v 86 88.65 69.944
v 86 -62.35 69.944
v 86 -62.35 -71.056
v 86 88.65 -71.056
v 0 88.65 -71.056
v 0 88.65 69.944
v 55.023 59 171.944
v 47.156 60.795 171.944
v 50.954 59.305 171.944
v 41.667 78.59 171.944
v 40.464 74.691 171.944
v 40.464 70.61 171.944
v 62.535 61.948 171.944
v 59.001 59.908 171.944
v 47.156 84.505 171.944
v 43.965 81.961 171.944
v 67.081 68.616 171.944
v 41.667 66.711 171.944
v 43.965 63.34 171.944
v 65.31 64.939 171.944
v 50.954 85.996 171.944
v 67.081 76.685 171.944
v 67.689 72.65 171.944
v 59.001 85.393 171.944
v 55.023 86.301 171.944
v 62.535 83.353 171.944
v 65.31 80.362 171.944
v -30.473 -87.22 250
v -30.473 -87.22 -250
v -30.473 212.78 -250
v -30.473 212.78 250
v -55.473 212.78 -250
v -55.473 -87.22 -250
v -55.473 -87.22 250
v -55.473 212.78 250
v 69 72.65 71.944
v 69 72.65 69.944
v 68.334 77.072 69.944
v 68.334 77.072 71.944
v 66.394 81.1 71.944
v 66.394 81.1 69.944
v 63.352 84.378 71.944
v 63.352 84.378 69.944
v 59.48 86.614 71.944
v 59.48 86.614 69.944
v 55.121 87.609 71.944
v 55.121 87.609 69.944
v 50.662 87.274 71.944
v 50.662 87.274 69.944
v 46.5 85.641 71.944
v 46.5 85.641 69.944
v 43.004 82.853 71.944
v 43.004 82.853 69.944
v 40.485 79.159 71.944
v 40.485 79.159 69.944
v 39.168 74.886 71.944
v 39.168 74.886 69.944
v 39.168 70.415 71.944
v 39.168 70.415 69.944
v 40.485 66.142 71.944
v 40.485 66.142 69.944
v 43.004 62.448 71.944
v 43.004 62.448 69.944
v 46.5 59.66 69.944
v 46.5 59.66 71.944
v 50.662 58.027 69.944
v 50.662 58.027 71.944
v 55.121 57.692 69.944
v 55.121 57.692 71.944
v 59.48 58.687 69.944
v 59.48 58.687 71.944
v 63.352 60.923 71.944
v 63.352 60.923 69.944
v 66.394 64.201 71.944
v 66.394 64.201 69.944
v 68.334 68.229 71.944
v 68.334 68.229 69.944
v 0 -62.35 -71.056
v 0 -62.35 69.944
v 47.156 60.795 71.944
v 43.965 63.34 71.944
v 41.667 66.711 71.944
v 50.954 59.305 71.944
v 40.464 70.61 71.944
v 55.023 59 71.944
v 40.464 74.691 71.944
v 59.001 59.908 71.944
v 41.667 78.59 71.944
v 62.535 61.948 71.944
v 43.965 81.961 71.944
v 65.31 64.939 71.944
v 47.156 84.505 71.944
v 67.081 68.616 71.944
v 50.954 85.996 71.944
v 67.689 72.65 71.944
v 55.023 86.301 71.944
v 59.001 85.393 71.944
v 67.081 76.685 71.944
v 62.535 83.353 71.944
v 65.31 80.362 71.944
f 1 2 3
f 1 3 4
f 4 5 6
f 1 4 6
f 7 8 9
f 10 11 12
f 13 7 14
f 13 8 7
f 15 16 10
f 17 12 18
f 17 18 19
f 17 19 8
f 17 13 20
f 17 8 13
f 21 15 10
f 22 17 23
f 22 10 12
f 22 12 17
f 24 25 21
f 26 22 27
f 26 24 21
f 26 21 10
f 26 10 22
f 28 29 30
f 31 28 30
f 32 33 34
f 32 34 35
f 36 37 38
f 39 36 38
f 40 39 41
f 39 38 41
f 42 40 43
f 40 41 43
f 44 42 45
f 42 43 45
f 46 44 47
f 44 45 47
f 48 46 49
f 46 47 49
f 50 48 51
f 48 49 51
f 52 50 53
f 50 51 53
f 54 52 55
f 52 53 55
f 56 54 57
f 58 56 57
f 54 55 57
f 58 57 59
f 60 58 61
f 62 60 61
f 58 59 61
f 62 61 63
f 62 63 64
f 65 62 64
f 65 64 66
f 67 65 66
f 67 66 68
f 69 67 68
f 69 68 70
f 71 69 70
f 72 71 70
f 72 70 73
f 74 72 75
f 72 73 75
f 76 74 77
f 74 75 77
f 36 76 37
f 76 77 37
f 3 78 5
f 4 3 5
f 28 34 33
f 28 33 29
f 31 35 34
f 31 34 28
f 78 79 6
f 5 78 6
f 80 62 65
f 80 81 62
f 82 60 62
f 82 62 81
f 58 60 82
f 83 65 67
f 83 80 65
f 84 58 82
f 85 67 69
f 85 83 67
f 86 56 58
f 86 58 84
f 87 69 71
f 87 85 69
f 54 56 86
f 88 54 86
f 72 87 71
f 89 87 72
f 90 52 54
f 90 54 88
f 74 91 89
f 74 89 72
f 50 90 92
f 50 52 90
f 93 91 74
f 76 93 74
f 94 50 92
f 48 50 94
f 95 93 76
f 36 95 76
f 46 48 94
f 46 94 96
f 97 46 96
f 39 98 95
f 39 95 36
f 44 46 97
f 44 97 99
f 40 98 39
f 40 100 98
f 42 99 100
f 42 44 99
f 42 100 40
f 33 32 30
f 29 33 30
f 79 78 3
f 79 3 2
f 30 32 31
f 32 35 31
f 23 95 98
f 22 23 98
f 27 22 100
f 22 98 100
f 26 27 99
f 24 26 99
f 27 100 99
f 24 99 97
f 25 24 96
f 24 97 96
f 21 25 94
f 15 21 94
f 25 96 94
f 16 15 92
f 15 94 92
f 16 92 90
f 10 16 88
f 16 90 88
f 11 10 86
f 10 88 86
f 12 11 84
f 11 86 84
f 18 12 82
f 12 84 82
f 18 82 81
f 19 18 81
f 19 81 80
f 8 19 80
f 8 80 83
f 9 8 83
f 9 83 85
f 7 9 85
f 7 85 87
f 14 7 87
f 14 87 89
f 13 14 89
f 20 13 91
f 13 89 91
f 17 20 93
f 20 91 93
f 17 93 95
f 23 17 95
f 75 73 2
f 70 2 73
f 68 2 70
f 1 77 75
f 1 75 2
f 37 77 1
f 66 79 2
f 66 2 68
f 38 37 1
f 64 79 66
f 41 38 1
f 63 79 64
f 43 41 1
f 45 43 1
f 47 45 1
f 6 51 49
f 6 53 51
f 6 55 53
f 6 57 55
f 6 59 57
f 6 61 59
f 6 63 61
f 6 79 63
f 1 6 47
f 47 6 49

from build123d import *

# Parameters (mm, degrees)
F0_W     = 151
F0_H     = 141
F1_DEPTH = 86
F2_R     = 15
F3_DEPTH = 2
F4_R     = 13.688921
F5_DEPTH = 100
F6_W     = 25
F6_H     = 300
F7_DEPTH = 250


with BuildPart() as f1:
    # F0 (on Right) → F1 (new body)
    with BuildSketch(Plane.YZ):
        with Locations((13.150447, -0.55588)):
            Rectangle(F0_W, F0_H)
    extrude(amount=F1_DEPTH)

    # F2 (on face) → F3 (join)
    with BuildSketch(Plane.XY.offset(69.94412)):
        with Locations((54, 72.650447)):
            Circle(F2_R)
    extrude(amount=F3_DEPTH)

    # F4 (on face) → F5 (join)
    with BuildSketch(Plane.XY.offset(71.94412)):
        with Locations((54, 72.650447)):
            Circle(F4_R)
    extrude(amount=F5_DEPTH)


with BuildPart() as f7:
    # F6 (on Top) → F7 (new body, symmetric)
    with BuildSketch(Plane.XY):
        with Locations((-42.973155, 62.780213)):
            Rectangle(F6_W, F6_H)
    extrude(amount=F7_DEPTH, both=True)


solid = Compound([f1.part, f7.part])
